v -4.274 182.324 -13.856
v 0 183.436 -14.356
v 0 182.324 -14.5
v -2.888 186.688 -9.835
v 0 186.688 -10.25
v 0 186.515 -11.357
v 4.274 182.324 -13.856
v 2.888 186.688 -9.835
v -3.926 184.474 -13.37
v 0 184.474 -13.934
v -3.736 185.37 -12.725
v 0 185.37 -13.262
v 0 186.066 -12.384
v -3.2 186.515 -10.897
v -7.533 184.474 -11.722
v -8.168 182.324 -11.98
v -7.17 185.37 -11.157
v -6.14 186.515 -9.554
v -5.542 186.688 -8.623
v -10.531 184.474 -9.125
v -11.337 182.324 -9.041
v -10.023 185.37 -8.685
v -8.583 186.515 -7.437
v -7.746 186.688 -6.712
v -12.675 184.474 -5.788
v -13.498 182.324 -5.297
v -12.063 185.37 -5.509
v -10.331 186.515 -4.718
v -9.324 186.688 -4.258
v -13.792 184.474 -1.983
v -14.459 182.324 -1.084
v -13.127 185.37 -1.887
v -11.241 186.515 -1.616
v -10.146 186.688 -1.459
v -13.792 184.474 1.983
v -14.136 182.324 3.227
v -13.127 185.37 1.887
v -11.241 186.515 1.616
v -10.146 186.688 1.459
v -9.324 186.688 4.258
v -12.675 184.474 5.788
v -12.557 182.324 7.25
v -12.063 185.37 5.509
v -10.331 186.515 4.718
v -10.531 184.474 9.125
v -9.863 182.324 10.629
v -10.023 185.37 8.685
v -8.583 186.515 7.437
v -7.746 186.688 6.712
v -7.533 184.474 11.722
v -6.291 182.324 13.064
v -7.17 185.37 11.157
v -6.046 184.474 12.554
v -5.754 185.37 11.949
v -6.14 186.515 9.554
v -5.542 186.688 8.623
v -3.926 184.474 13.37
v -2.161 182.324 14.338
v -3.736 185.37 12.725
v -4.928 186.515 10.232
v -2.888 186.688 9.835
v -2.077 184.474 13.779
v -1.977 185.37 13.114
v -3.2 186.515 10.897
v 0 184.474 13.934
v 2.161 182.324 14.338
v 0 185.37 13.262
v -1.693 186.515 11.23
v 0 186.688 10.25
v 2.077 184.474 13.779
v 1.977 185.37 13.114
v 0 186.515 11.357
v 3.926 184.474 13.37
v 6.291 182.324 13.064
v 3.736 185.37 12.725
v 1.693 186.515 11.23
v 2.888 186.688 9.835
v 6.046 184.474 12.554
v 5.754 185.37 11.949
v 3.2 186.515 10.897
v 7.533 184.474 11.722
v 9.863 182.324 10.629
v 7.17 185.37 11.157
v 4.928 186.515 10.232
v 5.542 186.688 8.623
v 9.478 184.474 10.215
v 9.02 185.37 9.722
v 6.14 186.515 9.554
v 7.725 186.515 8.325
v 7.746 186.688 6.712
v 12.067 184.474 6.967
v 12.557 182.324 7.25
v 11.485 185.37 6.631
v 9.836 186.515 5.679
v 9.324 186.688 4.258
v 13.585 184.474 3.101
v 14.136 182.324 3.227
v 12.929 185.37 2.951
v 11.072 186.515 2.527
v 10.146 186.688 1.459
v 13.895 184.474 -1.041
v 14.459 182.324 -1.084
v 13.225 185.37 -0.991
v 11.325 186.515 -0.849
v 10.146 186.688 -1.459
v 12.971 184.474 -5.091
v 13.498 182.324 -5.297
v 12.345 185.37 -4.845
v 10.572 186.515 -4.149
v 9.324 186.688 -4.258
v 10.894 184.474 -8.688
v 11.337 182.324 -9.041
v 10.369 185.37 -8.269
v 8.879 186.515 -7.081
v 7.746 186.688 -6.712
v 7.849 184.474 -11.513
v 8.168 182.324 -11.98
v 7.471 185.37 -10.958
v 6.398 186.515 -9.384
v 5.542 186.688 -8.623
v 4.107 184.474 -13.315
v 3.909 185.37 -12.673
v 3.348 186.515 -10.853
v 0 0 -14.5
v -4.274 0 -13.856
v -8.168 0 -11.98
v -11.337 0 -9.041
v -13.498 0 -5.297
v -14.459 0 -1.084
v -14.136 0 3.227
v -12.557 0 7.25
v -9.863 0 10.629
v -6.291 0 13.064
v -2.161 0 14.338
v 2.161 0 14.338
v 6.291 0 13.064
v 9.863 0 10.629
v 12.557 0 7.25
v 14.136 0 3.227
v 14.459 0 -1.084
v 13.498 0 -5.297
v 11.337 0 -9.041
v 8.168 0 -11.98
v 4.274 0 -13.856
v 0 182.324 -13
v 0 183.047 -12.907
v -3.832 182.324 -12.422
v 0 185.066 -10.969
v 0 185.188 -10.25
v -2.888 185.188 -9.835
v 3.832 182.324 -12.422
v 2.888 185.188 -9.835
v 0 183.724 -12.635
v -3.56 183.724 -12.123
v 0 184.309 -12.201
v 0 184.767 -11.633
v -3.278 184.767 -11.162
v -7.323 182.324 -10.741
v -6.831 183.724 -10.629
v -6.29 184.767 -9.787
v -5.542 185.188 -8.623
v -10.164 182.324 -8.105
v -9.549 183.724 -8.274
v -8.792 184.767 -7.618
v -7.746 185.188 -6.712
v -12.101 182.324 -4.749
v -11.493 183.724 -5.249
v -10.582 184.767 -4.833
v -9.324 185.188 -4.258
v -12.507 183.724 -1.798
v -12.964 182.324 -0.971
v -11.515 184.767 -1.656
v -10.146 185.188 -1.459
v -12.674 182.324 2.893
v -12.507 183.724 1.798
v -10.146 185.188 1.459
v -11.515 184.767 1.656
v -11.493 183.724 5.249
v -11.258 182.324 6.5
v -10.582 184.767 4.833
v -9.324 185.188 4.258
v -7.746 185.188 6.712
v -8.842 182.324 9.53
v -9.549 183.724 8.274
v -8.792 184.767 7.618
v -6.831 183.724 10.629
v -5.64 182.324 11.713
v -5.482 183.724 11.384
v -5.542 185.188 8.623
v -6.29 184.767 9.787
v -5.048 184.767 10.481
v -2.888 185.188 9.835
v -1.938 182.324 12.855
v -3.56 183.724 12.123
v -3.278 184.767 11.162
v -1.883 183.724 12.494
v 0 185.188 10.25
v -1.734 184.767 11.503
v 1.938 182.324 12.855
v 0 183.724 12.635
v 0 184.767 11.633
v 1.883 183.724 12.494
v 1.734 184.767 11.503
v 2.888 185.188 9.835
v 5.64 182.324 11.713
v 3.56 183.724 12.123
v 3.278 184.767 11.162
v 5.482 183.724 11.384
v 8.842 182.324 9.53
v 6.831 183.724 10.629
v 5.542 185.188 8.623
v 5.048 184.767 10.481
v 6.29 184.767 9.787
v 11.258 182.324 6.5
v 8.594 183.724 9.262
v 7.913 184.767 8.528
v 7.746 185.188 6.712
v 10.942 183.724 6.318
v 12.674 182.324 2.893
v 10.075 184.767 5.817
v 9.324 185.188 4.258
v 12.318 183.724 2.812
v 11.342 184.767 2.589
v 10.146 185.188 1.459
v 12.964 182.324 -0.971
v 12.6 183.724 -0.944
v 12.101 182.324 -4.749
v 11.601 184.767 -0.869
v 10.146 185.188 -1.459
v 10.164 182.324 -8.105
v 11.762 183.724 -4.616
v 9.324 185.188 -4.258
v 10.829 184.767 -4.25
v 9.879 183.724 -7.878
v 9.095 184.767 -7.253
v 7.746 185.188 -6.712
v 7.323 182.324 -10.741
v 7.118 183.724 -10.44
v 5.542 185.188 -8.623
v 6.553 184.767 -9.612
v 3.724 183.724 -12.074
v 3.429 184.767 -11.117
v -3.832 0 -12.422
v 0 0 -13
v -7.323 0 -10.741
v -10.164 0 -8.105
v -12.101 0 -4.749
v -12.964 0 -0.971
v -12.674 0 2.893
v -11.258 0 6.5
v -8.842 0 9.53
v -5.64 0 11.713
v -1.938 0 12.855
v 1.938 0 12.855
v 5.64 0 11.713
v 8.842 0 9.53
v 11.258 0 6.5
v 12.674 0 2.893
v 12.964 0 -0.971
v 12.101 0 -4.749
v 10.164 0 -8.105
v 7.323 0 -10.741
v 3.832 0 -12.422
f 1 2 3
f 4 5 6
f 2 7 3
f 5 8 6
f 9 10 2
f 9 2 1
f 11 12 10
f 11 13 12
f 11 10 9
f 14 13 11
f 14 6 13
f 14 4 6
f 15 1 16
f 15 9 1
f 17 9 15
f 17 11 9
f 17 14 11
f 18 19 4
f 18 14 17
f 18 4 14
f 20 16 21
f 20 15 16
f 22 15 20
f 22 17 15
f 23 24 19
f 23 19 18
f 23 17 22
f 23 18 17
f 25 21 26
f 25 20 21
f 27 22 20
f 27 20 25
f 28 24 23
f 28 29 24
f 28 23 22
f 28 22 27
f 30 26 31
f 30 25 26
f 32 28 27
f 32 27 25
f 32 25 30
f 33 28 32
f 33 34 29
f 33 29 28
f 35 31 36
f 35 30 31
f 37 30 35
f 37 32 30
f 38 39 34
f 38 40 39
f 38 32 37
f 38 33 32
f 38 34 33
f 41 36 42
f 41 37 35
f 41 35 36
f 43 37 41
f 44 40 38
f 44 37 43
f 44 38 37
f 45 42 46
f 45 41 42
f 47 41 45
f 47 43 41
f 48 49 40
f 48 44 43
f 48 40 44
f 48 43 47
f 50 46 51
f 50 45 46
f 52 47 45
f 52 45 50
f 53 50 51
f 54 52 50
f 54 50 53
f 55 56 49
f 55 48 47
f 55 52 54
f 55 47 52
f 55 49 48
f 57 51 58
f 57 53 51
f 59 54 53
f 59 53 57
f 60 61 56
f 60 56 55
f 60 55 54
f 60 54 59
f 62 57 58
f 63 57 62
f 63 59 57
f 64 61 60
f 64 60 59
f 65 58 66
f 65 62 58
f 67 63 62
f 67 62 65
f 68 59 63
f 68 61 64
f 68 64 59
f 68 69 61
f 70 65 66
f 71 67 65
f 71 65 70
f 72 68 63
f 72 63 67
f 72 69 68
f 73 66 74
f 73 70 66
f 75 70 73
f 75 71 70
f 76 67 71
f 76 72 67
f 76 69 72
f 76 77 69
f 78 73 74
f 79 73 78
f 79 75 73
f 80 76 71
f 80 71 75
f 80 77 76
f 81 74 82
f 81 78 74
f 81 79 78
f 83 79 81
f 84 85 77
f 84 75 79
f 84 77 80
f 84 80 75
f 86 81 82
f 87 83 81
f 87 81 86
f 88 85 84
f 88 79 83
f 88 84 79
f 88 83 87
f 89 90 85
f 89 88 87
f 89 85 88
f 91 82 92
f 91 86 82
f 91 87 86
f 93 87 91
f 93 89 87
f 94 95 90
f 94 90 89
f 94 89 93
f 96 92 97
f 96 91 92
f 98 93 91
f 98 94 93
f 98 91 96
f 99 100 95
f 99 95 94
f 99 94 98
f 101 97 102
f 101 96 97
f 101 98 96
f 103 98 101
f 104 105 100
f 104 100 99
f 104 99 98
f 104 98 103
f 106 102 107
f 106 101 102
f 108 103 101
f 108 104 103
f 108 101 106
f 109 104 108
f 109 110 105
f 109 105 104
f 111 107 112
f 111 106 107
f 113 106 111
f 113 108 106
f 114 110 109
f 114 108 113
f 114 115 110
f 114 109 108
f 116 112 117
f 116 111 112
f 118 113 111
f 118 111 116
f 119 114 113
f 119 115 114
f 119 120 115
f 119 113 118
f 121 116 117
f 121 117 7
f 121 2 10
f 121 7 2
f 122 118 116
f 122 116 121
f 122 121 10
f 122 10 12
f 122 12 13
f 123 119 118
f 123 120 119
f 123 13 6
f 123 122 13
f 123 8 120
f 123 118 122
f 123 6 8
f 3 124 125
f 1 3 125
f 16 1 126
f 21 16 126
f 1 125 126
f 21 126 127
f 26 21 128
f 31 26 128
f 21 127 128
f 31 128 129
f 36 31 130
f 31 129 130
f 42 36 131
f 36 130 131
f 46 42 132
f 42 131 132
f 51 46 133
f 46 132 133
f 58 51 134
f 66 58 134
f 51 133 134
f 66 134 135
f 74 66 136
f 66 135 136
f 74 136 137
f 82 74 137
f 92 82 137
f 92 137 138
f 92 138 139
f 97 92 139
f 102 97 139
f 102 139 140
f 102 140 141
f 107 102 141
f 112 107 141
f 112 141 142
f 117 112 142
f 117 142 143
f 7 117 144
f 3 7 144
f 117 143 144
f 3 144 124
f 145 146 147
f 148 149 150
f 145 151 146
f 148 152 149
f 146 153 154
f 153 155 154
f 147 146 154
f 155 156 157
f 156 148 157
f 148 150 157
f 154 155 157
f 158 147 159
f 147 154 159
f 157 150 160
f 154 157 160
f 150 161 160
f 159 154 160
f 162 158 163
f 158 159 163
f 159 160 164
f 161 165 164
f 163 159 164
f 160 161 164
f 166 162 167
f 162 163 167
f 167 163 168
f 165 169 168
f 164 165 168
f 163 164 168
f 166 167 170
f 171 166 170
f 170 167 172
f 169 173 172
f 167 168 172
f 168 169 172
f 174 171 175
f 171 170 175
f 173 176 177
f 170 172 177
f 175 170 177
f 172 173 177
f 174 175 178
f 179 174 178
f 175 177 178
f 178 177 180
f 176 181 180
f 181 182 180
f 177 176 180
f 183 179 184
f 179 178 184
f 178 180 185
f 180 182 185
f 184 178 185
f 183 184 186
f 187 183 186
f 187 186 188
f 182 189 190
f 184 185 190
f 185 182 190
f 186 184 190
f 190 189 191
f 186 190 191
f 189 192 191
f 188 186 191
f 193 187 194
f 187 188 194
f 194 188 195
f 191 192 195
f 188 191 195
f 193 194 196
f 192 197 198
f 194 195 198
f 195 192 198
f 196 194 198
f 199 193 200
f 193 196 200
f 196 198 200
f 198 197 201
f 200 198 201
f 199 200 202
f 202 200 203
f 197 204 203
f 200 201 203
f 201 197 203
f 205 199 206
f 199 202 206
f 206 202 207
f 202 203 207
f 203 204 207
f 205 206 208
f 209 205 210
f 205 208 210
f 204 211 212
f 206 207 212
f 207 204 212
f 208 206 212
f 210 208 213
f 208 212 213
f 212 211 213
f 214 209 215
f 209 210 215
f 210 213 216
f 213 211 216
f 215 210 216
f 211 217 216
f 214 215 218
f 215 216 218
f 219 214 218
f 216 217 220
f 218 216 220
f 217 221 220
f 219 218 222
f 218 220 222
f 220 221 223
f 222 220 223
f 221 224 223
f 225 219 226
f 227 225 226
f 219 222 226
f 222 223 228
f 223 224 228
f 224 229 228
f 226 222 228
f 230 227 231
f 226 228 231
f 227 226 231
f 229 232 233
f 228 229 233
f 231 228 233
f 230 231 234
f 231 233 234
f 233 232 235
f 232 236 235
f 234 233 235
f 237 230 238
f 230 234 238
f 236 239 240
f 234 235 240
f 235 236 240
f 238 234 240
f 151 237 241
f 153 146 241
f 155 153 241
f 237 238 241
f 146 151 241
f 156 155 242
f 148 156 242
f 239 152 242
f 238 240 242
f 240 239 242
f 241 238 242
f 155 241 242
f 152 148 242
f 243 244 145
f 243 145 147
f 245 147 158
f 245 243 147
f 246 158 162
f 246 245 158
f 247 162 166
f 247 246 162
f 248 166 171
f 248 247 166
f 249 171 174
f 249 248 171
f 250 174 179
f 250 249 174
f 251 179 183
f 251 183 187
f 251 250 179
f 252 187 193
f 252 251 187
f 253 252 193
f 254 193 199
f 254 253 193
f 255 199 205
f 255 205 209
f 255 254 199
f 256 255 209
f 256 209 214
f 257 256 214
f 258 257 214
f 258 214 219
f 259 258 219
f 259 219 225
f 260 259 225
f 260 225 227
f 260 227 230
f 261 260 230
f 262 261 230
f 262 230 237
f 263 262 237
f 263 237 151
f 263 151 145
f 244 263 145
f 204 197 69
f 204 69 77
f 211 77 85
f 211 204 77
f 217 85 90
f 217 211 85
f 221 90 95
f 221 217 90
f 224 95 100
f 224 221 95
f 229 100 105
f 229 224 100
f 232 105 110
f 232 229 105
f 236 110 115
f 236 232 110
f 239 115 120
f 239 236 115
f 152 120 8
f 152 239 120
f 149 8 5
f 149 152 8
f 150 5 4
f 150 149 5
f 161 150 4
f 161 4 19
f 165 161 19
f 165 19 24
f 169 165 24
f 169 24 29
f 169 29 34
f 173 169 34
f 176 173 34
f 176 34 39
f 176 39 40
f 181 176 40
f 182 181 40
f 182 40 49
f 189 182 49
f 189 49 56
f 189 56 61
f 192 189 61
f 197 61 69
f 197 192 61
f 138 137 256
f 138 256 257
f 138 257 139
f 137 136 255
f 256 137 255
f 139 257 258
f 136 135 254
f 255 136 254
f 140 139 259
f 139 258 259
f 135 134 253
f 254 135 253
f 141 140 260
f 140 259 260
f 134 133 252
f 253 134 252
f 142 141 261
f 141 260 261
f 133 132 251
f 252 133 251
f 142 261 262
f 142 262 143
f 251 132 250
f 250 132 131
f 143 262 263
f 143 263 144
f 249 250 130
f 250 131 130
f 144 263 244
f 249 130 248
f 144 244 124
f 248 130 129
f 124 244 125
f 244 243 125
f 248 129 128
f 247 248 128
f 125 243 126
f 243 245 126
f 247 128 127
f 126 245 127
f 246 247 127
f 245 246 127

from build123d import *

# Parameters (mm, degrees)
SKETCH1_R           = 14.5
BASE_DEPTH          = 186.69
TOP_FILLET_R        = 4.365625
CASING_WALLS_T      = -1.5
SKETCH2_R           = 10.25
TOP_HOLE_DEPTH      = 188.812821995
TOP_HOLE_DEPTH_BACK = 188.812821995


with BuildPart() as part:
    # Sketch1 → base (new body)
    with BuildSketch(Plane(origin=(0, 0, 0), x_dir=(1, 0, 0), z_dir=(0, 1, 0))):
        with Locations(Location((0, 0, 0), (0, 0, 90))):
            Circle(SKETCH1_R)
    extrude(amount=BASE_DEPTH)

    # top-fillet
    top_fillet_edges = [part.edges().sort_by_distance(p)[0] for p in [
        (0, 186.69, 14.5),
    ]]
    fillet(top_fillet_edges, radius=TOP_FILLET_R)

    # casing-walls
    casing_walls_openings = [part.faces().sort_by_distance(p)[0] for p in [
        (0, 0, 0),
    ]]
    offset(amount=CASING_WALLS_T, openings=casing_walls_openings, kind=Kind.INTERSECTION)

    # Sketch2 → top-hole (cut, two sides)
    with BuildSketch(Plane(origin=(0, 0, 0), x_dir=(1, 0, 0), z_dir=(0, 1, 0))) as top_hole_sk:
        with Locations(Location((0, 0, 0), (0, 0, 270))):
            Circle(SKETCH2_R)
    extrude(amount=TOP_HOLE_DEPTH, mode=Mode.SUBTRACT)
    extrude(top_hole_sk.sketch, amount=-TOP_HOLE_DEPTH_BACK, mode=Mode.SUBTRACT)


solid = part.part
